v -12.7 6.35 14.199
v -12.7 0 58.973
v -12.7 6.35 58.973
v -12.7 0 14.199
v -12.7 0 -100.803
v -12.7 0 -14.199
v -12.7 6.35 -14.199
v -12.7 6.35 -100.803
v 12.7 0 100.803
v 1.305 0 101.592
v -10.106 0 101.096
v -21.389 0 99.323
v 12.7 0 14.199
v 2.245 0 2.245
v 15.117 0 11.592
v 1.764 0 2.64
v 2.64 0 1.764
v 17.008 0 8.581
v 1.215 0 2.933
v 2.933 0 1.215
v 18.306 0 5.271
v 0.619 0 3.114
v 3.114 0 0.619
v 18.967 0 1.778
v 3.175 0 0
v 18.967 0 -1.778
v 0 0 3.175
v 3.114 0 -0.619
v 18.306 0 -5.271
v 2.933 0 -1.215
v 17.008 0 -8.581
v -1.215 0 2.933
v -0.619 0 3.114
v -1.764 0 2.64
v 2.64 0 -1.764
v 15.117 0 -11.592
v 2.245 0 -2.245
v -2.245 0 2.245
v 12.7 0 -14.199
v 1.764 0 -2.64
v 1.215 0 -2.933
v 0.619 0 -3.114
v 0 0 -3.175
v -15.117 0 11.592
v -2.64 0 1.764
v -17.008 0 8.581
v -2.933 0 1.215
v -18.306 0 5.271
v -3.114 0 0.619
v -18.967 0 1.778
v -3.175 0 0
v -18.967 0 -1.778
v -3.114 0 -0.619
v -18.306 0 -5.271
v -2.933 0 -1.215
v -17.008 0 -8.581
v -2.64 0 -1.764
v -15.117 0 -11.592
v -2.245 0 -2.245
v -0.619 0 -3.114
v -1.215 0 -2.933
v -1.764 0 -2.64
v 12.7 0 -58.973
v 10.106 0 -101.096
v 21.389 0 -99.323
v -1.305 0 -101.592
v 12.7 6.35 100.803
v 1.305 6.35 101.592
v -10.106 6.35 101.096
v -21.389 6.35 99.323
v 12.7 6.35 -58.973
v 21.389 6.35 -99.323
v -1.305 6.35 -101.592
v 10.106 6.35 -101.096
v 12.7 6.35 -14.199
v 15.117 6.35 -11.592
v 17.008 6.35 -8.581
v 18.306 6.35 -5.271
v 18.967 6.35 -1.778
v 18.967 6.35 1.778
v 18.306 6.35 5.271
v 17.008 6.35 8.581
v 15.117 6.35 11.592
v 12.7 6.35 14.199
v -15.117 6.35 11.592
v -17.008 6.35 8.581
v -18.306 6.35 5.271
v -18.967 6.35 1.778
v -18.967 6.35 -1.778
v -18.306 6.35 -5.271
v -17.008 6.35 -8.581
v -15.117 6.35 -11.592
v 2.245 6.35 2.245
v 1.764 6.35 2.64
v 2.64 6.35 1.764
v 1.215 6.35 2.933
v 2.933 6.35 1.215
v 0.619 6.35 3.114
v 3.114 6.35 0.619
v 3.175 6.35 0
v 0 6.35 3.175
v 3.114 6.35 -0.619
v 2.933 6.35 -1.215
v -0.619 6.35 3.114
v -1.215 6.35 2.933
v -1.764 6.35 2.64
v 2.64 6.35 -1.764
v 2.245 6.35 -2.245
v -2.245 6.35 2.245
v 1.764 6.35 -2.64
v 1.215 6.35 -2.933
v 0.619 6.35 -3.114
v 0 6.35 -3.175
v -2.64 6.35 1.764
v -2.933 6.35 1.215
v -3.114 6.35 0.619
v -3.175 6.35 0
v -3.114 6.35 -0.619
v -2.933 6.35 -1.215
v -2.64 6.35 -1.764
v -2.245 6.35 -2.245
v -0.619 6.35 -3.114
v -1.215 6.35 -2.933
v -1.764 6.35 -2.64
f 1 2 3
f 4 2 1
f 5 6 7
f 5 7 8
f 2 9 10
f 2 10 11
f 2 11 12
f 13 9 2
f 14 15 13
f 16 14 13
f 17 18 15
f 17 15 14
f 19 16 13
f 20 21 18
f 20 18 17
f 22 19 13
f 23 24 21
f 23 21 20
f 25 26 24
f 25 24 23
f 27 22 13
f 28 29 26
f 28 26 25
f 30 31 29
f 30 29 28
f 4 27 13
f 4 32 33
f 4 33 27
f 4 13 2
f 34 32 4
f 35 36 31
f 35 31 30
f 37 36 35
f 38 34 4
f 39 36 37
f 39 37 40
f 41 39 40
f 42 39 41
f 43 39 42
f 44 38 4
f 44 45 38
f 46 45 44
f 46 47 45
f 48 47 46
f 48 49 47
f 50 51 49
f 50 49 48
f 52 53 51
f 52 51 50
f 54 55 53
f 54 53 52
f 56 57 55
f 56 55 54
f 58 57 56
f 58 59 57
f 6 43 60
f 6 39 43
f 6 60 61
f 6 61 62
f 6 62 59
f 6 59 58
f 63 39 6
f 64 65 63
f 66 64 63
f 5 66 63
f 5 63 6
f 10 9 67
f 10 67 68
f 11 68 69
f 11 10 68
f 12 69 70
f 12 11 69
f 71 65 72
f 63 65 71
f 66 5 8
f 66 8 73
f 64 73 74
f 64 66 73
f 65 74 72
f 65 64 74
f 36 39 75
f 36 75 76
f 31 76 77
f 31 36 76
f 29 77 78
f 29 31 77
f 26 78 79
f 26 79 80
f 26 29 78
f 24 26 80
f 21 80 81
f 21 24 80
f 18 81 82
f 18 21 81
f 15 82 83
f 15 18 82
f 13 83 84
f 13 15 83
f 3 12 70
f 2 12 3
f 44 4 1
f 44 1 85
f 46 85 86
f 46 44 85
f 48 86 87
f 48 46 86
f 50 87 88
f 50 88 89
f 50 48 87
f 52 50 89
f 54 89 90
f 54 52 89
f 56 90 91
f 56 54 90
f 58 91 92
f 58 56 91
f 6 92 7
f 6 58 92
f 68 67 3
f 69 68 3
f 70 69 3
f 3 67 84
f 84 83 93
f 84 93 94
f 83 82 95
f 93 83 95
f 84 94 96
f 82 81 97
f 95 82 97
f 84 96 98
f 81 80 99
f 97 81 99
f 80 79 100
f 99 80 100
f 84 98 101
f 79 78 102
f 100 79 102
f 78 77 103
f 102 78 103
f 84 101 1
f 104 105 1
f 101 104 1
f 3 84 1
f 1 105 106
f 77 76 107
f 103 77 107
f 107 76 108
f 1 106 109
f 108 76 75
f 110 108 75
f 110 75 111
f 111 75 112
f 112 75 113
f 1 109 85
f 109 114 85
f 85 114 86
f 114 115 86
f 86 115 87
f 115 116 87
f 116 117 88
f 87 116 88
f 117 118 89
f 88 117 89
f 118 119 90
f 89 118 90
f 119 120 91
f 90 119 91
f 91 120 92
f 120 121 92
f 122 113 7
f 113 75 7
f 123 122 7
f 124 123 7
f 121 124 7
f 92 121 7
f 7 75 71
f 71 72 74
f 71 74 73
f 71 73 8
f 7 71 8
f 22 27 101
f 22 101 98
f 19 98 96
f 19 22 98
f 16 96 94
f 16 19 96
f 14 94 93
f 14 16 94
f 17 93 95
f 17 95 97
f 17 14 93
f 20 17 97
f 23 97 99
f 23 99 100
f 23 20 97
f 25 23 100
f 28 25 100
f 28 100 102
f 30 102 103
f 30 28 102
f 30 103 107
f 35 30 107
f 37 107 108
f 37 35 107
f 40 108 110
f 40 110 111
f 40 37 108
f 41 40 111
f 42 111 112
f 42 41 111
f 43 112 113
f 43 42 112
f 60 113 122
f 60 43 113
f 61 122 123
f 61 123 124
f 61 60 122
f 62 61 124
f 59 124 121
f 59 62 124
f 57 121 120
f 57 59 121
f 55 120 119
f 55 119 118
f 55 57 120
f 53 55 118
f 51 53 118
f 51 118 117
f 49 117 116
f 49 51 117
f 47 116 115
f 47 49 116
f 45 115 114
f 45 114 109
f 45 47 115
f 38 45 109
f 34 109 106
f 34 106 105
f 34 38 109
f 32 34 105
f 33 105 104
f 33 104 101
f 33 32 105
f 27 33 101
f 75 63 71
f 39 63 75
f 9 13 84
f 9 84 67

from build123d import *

# Parameters (mm, degrees)
SKETCH1_R           = 3.175
BOSS_EXTRUDE1_DEPTH = 6.35


with BuildPart() as part:
    # Sketch1 → Boss-Extrude1 (new body)
    with BuildSketch(Plane(origin=(0, 0, 0), x_dir=(1, 0, 0), z_dir=(0, 1, 0))):
        with BuildLine():
            ThreePointArc((12.7, 14.199031657), (19.05, 0), (12.7, -14.199031657))
            Line((12.7, -14.199031657), (12.7, -100.803124952))
            ThreePointArc((12.7, -100.803124952), (-4.407318933, -101.504362171), (-21.389473684, -99.322960163))
            Line((-21.389473684, -99.322960163), (-12.7, -58.973007597))
            Line((-12.7, -58.973007597), (-12.7, -14.199031657))
            ThreePointArc((-12.7, -14.199031657), (-19.05, 0), (-12.7, 14.199031657))
            Line((-12.7, 14.199031657), (-12.7, 100.803124952))
            ThreePointArc((-12.7, 100.803124952), (4.407318933, 101.504362171), (21.389473684, 99.322960163))
            Line((21.389473684, 99.322960163), (12.7, 58.973007597))
            Line((12.7, 58.973007597), (12.7, 14.199031657))
        make_face()
        with Locations(Location((0, 0, 0), (0, 0, 270))):
            Circle(SKETCH1_R, mode=Mode.SUBTRACT)
    extrude(amount=BOSS_EXTRUDE1_DEPTH)


solid = part.part
